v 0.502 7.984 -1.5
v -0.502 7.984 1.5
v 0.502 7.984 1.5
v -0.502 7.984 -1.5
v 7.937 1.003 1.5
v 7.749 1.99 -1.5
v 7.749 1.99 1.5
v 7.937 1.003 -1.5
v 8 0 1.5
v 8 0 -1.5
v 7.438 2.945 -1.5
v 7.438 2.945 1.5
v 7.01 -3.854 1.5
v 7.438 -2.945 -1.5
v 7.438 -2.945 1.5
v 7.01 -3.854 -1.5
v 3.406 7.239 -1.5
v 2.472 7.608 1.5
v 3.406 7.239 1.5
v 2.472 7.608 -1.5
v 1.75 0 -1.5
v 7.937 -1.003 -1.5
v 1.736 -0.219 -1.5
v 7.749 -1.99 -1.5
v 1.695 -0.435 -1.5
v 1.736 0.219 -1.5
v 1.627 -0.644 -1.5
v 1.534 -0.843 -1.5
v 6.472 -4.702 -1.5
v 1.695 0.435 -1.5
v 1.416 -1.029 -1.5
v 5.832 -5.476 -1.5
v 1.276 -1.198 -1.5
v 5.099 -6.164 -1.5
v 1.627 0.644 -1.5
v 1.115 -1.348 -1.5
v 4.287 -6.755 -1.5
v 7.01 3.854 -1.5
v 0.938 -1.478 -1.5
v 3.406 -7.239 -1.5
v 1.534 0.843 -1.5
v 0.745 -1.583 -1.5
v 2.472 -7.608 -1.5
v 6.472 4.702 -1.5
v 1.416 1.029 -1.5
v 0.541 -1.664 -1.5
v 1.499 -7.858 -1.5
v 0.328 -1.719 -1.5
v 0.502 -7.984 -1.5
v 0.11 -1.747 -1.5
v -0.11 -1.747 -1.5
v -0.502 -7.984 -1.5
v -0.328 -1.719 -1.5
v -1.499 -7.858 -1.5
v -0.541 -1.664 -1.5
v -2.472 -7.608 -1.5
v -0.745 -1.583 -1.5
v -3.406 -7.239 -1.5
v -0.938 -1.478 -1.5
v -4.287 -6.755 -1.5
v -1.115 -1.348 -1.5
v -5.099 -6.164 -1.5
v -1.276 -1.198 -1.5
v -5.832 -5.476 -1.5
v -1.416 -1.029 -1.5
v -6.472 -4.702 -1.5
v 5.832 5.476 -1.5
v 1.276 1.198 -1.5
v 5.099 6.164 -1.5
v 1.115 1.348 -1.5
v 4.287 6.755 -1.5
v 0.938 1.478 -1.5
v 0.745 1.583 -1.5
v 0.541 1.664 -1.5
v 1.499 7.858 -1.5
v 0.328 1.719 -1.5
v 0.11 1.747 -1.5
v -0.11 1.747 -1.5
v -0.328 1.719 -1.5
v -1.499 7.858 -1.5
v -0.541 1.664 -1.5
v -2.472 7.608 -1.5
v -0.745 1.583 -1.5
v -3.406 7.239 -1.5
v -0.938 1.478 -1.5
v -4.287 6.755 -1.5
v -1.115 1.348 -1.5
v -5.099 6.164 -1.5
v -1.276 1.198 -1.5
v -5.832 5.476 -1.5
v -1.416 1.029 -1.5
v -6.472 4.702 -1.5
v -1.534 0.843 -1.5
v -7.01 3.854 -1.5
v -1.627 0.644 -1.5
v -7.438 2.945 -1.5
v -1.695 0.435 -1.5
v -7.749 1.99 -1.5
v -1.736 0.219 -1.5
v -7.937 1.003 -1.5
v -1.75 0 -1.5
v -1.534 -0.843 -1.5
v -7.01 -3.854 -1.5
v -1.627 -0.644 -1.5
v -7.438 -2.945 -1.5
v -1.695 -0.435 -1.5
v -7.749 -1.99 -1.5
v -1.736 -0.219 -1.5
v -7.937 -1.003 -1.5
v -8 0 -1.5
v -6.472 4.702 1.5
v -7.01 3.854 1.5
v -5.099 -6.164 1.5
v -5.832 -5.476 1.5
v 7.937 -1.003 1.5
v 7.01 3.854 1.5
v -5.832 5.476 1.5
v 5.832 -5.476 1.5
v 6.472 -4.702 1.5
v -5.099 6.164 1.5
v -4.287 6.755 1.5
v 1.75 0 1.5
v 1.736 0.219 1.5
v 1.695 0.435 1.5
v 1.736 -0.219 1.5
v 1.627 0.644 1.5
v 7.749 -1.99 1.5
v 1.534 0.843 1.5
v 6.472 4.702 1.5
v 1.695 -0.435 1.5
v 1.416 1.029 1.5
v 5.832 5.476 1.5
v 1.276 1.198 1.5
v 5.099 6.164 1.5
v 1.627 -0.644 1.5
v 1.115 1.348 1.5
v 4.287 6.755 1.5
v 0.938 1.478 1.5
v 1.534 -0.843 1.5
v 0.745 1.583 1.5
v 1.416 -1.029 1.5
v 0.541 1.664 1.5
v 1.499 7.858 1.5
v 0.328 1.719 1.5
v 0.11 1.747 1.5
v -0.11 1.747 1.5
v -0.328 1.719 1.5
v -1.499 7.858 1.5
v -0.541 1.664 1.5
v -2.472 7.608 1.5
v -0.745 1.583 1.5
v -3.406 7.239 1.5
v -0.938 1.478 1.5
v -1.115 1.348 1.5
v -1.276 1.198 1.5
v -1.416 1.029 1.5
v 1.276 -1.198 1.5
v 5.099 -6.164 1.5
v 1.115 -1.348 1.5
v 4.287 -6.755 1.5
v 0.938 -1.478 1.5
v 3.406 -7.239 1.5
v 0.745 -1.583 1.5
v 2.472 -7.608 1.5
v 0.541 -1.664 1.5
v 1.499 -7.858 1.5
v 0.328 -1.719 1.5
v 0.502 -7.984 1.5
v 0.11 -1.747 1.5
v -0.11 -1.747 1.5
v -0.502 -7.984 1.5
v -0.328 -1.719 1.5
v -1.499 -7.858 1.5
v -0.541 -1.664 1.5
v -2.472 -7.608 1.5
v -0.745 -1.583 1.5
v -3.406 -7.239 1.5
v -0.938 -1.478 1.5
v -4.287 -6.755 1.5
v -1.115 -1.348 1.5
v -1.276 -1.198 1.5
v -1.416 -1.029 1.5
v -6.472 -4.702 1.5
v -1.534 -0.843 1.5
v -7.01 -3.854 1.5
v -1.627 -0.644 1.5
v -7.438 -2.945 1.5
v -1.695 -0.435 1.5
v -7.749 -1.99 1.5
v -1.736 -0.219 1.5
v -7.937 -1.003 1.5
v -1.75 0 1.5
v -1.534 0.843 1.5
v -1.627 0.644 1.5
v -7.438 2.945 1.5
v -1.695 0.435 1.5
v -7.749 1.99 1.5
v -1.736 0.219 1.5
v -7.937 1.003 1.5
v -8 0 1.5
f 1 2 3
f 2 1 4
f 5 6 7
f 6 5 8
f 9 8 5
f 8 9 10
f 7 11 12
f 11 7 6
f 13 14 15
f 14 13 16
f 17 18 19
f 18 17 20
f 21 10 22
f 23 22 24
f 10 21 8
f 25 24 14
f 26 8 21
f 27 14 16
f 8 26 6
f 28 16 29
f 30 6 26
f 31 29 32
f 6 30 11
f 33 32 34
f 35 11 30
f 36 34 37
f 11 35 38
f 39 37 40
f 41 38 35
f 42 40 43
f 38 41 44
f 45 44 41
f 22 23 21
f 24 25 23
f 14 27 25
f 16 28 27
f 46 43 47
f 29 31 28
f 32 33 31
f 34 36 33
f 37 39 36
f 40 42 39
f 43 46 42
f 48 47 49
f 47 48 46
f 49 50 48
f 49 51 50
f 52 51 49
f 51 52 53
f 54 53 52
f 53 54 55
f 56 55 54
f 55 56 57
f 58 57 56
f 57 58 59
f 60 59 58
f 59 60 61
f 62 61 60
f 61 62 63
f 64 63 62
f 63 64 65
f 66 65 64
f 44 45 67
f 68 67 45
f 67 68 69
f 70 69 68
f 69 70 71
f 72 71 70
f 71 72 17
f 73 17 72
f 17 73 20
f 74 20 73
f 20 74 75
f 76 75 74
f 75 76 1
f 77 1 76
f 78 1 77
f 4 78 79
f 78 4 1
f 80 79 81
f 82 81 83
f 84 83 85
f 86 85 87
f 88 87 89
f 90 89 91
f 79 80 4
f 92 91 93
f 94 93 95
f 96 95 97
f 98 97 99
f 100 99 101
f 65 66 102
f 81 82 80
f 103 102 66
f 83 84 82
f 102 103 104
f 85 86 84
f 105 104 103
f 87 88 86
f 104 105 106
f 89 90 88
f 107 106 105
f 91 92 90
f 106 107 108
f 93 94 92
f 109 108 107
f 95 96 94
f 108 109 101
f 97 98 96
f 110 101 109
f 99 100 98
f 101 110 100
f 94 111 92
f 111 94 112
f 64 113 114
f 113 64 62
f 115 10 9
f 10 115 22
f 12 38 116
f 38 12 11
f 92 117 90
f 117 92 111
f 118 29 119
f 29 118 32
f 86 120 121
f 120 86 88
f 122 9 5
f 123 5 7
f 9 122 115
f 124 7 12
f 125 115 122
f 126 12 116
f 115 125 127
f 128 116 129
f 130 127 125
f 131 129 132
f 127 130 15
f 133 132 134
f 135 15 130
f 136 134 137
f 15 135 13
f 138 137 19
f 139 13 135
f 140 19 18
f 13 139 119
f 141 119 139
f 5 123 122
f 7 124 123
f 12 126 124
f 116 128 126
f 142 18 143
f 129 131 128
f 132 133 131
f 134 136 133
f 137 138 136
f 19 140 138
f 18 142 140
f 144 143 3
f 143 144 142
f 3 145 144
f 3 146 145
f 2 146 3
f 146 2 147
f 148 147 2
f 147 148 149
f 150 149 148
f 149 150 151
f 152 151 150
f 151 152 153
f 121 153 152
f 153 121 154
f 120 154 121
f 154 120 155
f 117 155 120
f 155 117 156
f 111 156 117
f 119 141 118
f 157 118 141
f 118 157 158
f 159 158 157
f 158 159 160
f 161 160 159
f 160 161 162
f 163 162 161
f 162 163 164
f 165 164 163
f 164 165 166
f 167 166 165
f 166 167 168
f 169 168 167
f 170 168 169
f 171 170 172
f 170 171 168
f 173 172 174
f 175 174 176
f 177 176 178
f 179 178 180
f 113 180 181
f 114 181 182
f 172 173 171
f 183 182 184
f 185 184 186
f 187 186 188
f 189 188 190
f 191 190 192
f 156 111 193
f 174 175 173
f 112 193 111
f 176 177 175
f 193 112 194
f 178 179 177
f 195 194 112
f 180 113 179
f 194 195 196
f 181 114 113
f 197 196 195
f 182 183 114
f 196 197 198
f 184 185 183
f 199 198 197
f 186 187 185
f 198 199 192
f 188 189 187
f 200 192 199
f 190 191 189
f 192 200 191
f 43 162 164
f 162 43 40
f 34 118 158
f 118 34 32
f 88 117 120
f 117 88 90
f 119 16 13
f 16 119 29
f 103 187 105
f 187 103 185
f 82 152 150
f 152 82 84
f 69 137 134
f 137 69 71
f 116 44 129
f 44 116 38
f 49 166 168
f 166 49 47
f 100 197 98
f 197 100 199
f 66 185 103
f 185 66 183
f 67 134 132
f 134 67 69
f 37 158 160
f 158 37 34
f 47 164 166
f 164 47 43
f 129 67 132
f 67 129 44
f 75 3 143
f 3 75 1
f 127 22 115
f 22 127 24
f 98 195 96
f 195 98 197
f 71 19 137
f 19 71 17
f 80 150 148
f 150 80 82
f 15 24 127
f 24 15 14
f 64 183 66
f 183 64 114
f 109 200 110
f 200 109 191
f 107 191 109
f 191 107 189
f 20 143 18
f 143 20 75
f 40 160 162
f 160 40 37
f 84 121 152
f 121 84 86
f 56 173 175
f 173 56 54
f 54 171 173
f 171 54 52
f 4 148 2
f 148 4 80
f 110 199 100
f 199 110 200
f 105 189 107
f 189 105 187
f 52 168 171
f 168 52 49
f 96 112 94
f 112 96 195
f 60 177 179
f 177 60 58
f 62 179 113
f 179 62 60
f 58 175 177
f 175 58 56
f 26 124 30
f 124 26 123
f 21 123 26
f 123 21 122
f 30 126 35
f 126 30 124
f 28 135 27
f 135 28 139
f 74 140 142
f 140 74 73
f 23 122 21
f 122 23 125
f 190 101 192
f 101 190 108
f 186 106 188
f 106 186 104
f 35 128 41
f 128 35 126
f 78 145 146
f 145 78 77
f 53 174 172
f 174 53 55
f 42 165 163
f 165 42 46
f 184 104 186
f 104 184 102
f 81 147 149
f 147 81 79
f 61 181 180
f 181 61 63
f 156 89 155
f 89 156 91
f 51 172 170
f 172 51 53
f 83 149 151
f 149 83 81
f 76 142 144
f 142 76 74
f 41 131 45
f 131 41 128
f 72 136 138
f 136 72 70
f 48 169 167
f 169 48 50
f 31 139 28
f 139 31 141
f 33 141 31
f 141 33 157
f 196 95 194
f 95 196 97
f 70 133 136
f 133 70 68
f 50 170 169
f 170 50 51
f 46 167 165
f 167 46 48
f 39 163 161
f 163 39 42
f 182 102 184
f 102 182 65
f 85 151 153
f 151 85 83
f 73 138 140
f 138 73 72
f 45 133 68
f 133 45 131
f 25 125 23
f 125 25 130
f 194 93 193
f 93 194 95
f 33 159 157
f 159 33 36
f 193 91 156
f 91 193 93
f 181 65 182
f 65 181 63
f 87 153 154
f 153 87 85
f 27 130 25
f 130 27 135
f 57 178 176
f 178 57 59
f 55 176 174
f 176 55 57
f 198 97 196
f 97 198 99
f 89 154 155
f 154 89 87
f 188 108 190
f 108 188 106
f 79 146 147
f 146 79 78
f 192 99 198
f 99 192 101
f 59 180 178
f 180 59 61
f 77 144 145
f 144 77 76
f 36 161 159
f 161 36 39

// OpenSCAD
D = 16;
d = 3.5;
h = 3;
$fn = 50;

difference(){
  cylinder(d=D, h=h, center=true);
  cylinder(d=d, h=h+2, center=true);
}
